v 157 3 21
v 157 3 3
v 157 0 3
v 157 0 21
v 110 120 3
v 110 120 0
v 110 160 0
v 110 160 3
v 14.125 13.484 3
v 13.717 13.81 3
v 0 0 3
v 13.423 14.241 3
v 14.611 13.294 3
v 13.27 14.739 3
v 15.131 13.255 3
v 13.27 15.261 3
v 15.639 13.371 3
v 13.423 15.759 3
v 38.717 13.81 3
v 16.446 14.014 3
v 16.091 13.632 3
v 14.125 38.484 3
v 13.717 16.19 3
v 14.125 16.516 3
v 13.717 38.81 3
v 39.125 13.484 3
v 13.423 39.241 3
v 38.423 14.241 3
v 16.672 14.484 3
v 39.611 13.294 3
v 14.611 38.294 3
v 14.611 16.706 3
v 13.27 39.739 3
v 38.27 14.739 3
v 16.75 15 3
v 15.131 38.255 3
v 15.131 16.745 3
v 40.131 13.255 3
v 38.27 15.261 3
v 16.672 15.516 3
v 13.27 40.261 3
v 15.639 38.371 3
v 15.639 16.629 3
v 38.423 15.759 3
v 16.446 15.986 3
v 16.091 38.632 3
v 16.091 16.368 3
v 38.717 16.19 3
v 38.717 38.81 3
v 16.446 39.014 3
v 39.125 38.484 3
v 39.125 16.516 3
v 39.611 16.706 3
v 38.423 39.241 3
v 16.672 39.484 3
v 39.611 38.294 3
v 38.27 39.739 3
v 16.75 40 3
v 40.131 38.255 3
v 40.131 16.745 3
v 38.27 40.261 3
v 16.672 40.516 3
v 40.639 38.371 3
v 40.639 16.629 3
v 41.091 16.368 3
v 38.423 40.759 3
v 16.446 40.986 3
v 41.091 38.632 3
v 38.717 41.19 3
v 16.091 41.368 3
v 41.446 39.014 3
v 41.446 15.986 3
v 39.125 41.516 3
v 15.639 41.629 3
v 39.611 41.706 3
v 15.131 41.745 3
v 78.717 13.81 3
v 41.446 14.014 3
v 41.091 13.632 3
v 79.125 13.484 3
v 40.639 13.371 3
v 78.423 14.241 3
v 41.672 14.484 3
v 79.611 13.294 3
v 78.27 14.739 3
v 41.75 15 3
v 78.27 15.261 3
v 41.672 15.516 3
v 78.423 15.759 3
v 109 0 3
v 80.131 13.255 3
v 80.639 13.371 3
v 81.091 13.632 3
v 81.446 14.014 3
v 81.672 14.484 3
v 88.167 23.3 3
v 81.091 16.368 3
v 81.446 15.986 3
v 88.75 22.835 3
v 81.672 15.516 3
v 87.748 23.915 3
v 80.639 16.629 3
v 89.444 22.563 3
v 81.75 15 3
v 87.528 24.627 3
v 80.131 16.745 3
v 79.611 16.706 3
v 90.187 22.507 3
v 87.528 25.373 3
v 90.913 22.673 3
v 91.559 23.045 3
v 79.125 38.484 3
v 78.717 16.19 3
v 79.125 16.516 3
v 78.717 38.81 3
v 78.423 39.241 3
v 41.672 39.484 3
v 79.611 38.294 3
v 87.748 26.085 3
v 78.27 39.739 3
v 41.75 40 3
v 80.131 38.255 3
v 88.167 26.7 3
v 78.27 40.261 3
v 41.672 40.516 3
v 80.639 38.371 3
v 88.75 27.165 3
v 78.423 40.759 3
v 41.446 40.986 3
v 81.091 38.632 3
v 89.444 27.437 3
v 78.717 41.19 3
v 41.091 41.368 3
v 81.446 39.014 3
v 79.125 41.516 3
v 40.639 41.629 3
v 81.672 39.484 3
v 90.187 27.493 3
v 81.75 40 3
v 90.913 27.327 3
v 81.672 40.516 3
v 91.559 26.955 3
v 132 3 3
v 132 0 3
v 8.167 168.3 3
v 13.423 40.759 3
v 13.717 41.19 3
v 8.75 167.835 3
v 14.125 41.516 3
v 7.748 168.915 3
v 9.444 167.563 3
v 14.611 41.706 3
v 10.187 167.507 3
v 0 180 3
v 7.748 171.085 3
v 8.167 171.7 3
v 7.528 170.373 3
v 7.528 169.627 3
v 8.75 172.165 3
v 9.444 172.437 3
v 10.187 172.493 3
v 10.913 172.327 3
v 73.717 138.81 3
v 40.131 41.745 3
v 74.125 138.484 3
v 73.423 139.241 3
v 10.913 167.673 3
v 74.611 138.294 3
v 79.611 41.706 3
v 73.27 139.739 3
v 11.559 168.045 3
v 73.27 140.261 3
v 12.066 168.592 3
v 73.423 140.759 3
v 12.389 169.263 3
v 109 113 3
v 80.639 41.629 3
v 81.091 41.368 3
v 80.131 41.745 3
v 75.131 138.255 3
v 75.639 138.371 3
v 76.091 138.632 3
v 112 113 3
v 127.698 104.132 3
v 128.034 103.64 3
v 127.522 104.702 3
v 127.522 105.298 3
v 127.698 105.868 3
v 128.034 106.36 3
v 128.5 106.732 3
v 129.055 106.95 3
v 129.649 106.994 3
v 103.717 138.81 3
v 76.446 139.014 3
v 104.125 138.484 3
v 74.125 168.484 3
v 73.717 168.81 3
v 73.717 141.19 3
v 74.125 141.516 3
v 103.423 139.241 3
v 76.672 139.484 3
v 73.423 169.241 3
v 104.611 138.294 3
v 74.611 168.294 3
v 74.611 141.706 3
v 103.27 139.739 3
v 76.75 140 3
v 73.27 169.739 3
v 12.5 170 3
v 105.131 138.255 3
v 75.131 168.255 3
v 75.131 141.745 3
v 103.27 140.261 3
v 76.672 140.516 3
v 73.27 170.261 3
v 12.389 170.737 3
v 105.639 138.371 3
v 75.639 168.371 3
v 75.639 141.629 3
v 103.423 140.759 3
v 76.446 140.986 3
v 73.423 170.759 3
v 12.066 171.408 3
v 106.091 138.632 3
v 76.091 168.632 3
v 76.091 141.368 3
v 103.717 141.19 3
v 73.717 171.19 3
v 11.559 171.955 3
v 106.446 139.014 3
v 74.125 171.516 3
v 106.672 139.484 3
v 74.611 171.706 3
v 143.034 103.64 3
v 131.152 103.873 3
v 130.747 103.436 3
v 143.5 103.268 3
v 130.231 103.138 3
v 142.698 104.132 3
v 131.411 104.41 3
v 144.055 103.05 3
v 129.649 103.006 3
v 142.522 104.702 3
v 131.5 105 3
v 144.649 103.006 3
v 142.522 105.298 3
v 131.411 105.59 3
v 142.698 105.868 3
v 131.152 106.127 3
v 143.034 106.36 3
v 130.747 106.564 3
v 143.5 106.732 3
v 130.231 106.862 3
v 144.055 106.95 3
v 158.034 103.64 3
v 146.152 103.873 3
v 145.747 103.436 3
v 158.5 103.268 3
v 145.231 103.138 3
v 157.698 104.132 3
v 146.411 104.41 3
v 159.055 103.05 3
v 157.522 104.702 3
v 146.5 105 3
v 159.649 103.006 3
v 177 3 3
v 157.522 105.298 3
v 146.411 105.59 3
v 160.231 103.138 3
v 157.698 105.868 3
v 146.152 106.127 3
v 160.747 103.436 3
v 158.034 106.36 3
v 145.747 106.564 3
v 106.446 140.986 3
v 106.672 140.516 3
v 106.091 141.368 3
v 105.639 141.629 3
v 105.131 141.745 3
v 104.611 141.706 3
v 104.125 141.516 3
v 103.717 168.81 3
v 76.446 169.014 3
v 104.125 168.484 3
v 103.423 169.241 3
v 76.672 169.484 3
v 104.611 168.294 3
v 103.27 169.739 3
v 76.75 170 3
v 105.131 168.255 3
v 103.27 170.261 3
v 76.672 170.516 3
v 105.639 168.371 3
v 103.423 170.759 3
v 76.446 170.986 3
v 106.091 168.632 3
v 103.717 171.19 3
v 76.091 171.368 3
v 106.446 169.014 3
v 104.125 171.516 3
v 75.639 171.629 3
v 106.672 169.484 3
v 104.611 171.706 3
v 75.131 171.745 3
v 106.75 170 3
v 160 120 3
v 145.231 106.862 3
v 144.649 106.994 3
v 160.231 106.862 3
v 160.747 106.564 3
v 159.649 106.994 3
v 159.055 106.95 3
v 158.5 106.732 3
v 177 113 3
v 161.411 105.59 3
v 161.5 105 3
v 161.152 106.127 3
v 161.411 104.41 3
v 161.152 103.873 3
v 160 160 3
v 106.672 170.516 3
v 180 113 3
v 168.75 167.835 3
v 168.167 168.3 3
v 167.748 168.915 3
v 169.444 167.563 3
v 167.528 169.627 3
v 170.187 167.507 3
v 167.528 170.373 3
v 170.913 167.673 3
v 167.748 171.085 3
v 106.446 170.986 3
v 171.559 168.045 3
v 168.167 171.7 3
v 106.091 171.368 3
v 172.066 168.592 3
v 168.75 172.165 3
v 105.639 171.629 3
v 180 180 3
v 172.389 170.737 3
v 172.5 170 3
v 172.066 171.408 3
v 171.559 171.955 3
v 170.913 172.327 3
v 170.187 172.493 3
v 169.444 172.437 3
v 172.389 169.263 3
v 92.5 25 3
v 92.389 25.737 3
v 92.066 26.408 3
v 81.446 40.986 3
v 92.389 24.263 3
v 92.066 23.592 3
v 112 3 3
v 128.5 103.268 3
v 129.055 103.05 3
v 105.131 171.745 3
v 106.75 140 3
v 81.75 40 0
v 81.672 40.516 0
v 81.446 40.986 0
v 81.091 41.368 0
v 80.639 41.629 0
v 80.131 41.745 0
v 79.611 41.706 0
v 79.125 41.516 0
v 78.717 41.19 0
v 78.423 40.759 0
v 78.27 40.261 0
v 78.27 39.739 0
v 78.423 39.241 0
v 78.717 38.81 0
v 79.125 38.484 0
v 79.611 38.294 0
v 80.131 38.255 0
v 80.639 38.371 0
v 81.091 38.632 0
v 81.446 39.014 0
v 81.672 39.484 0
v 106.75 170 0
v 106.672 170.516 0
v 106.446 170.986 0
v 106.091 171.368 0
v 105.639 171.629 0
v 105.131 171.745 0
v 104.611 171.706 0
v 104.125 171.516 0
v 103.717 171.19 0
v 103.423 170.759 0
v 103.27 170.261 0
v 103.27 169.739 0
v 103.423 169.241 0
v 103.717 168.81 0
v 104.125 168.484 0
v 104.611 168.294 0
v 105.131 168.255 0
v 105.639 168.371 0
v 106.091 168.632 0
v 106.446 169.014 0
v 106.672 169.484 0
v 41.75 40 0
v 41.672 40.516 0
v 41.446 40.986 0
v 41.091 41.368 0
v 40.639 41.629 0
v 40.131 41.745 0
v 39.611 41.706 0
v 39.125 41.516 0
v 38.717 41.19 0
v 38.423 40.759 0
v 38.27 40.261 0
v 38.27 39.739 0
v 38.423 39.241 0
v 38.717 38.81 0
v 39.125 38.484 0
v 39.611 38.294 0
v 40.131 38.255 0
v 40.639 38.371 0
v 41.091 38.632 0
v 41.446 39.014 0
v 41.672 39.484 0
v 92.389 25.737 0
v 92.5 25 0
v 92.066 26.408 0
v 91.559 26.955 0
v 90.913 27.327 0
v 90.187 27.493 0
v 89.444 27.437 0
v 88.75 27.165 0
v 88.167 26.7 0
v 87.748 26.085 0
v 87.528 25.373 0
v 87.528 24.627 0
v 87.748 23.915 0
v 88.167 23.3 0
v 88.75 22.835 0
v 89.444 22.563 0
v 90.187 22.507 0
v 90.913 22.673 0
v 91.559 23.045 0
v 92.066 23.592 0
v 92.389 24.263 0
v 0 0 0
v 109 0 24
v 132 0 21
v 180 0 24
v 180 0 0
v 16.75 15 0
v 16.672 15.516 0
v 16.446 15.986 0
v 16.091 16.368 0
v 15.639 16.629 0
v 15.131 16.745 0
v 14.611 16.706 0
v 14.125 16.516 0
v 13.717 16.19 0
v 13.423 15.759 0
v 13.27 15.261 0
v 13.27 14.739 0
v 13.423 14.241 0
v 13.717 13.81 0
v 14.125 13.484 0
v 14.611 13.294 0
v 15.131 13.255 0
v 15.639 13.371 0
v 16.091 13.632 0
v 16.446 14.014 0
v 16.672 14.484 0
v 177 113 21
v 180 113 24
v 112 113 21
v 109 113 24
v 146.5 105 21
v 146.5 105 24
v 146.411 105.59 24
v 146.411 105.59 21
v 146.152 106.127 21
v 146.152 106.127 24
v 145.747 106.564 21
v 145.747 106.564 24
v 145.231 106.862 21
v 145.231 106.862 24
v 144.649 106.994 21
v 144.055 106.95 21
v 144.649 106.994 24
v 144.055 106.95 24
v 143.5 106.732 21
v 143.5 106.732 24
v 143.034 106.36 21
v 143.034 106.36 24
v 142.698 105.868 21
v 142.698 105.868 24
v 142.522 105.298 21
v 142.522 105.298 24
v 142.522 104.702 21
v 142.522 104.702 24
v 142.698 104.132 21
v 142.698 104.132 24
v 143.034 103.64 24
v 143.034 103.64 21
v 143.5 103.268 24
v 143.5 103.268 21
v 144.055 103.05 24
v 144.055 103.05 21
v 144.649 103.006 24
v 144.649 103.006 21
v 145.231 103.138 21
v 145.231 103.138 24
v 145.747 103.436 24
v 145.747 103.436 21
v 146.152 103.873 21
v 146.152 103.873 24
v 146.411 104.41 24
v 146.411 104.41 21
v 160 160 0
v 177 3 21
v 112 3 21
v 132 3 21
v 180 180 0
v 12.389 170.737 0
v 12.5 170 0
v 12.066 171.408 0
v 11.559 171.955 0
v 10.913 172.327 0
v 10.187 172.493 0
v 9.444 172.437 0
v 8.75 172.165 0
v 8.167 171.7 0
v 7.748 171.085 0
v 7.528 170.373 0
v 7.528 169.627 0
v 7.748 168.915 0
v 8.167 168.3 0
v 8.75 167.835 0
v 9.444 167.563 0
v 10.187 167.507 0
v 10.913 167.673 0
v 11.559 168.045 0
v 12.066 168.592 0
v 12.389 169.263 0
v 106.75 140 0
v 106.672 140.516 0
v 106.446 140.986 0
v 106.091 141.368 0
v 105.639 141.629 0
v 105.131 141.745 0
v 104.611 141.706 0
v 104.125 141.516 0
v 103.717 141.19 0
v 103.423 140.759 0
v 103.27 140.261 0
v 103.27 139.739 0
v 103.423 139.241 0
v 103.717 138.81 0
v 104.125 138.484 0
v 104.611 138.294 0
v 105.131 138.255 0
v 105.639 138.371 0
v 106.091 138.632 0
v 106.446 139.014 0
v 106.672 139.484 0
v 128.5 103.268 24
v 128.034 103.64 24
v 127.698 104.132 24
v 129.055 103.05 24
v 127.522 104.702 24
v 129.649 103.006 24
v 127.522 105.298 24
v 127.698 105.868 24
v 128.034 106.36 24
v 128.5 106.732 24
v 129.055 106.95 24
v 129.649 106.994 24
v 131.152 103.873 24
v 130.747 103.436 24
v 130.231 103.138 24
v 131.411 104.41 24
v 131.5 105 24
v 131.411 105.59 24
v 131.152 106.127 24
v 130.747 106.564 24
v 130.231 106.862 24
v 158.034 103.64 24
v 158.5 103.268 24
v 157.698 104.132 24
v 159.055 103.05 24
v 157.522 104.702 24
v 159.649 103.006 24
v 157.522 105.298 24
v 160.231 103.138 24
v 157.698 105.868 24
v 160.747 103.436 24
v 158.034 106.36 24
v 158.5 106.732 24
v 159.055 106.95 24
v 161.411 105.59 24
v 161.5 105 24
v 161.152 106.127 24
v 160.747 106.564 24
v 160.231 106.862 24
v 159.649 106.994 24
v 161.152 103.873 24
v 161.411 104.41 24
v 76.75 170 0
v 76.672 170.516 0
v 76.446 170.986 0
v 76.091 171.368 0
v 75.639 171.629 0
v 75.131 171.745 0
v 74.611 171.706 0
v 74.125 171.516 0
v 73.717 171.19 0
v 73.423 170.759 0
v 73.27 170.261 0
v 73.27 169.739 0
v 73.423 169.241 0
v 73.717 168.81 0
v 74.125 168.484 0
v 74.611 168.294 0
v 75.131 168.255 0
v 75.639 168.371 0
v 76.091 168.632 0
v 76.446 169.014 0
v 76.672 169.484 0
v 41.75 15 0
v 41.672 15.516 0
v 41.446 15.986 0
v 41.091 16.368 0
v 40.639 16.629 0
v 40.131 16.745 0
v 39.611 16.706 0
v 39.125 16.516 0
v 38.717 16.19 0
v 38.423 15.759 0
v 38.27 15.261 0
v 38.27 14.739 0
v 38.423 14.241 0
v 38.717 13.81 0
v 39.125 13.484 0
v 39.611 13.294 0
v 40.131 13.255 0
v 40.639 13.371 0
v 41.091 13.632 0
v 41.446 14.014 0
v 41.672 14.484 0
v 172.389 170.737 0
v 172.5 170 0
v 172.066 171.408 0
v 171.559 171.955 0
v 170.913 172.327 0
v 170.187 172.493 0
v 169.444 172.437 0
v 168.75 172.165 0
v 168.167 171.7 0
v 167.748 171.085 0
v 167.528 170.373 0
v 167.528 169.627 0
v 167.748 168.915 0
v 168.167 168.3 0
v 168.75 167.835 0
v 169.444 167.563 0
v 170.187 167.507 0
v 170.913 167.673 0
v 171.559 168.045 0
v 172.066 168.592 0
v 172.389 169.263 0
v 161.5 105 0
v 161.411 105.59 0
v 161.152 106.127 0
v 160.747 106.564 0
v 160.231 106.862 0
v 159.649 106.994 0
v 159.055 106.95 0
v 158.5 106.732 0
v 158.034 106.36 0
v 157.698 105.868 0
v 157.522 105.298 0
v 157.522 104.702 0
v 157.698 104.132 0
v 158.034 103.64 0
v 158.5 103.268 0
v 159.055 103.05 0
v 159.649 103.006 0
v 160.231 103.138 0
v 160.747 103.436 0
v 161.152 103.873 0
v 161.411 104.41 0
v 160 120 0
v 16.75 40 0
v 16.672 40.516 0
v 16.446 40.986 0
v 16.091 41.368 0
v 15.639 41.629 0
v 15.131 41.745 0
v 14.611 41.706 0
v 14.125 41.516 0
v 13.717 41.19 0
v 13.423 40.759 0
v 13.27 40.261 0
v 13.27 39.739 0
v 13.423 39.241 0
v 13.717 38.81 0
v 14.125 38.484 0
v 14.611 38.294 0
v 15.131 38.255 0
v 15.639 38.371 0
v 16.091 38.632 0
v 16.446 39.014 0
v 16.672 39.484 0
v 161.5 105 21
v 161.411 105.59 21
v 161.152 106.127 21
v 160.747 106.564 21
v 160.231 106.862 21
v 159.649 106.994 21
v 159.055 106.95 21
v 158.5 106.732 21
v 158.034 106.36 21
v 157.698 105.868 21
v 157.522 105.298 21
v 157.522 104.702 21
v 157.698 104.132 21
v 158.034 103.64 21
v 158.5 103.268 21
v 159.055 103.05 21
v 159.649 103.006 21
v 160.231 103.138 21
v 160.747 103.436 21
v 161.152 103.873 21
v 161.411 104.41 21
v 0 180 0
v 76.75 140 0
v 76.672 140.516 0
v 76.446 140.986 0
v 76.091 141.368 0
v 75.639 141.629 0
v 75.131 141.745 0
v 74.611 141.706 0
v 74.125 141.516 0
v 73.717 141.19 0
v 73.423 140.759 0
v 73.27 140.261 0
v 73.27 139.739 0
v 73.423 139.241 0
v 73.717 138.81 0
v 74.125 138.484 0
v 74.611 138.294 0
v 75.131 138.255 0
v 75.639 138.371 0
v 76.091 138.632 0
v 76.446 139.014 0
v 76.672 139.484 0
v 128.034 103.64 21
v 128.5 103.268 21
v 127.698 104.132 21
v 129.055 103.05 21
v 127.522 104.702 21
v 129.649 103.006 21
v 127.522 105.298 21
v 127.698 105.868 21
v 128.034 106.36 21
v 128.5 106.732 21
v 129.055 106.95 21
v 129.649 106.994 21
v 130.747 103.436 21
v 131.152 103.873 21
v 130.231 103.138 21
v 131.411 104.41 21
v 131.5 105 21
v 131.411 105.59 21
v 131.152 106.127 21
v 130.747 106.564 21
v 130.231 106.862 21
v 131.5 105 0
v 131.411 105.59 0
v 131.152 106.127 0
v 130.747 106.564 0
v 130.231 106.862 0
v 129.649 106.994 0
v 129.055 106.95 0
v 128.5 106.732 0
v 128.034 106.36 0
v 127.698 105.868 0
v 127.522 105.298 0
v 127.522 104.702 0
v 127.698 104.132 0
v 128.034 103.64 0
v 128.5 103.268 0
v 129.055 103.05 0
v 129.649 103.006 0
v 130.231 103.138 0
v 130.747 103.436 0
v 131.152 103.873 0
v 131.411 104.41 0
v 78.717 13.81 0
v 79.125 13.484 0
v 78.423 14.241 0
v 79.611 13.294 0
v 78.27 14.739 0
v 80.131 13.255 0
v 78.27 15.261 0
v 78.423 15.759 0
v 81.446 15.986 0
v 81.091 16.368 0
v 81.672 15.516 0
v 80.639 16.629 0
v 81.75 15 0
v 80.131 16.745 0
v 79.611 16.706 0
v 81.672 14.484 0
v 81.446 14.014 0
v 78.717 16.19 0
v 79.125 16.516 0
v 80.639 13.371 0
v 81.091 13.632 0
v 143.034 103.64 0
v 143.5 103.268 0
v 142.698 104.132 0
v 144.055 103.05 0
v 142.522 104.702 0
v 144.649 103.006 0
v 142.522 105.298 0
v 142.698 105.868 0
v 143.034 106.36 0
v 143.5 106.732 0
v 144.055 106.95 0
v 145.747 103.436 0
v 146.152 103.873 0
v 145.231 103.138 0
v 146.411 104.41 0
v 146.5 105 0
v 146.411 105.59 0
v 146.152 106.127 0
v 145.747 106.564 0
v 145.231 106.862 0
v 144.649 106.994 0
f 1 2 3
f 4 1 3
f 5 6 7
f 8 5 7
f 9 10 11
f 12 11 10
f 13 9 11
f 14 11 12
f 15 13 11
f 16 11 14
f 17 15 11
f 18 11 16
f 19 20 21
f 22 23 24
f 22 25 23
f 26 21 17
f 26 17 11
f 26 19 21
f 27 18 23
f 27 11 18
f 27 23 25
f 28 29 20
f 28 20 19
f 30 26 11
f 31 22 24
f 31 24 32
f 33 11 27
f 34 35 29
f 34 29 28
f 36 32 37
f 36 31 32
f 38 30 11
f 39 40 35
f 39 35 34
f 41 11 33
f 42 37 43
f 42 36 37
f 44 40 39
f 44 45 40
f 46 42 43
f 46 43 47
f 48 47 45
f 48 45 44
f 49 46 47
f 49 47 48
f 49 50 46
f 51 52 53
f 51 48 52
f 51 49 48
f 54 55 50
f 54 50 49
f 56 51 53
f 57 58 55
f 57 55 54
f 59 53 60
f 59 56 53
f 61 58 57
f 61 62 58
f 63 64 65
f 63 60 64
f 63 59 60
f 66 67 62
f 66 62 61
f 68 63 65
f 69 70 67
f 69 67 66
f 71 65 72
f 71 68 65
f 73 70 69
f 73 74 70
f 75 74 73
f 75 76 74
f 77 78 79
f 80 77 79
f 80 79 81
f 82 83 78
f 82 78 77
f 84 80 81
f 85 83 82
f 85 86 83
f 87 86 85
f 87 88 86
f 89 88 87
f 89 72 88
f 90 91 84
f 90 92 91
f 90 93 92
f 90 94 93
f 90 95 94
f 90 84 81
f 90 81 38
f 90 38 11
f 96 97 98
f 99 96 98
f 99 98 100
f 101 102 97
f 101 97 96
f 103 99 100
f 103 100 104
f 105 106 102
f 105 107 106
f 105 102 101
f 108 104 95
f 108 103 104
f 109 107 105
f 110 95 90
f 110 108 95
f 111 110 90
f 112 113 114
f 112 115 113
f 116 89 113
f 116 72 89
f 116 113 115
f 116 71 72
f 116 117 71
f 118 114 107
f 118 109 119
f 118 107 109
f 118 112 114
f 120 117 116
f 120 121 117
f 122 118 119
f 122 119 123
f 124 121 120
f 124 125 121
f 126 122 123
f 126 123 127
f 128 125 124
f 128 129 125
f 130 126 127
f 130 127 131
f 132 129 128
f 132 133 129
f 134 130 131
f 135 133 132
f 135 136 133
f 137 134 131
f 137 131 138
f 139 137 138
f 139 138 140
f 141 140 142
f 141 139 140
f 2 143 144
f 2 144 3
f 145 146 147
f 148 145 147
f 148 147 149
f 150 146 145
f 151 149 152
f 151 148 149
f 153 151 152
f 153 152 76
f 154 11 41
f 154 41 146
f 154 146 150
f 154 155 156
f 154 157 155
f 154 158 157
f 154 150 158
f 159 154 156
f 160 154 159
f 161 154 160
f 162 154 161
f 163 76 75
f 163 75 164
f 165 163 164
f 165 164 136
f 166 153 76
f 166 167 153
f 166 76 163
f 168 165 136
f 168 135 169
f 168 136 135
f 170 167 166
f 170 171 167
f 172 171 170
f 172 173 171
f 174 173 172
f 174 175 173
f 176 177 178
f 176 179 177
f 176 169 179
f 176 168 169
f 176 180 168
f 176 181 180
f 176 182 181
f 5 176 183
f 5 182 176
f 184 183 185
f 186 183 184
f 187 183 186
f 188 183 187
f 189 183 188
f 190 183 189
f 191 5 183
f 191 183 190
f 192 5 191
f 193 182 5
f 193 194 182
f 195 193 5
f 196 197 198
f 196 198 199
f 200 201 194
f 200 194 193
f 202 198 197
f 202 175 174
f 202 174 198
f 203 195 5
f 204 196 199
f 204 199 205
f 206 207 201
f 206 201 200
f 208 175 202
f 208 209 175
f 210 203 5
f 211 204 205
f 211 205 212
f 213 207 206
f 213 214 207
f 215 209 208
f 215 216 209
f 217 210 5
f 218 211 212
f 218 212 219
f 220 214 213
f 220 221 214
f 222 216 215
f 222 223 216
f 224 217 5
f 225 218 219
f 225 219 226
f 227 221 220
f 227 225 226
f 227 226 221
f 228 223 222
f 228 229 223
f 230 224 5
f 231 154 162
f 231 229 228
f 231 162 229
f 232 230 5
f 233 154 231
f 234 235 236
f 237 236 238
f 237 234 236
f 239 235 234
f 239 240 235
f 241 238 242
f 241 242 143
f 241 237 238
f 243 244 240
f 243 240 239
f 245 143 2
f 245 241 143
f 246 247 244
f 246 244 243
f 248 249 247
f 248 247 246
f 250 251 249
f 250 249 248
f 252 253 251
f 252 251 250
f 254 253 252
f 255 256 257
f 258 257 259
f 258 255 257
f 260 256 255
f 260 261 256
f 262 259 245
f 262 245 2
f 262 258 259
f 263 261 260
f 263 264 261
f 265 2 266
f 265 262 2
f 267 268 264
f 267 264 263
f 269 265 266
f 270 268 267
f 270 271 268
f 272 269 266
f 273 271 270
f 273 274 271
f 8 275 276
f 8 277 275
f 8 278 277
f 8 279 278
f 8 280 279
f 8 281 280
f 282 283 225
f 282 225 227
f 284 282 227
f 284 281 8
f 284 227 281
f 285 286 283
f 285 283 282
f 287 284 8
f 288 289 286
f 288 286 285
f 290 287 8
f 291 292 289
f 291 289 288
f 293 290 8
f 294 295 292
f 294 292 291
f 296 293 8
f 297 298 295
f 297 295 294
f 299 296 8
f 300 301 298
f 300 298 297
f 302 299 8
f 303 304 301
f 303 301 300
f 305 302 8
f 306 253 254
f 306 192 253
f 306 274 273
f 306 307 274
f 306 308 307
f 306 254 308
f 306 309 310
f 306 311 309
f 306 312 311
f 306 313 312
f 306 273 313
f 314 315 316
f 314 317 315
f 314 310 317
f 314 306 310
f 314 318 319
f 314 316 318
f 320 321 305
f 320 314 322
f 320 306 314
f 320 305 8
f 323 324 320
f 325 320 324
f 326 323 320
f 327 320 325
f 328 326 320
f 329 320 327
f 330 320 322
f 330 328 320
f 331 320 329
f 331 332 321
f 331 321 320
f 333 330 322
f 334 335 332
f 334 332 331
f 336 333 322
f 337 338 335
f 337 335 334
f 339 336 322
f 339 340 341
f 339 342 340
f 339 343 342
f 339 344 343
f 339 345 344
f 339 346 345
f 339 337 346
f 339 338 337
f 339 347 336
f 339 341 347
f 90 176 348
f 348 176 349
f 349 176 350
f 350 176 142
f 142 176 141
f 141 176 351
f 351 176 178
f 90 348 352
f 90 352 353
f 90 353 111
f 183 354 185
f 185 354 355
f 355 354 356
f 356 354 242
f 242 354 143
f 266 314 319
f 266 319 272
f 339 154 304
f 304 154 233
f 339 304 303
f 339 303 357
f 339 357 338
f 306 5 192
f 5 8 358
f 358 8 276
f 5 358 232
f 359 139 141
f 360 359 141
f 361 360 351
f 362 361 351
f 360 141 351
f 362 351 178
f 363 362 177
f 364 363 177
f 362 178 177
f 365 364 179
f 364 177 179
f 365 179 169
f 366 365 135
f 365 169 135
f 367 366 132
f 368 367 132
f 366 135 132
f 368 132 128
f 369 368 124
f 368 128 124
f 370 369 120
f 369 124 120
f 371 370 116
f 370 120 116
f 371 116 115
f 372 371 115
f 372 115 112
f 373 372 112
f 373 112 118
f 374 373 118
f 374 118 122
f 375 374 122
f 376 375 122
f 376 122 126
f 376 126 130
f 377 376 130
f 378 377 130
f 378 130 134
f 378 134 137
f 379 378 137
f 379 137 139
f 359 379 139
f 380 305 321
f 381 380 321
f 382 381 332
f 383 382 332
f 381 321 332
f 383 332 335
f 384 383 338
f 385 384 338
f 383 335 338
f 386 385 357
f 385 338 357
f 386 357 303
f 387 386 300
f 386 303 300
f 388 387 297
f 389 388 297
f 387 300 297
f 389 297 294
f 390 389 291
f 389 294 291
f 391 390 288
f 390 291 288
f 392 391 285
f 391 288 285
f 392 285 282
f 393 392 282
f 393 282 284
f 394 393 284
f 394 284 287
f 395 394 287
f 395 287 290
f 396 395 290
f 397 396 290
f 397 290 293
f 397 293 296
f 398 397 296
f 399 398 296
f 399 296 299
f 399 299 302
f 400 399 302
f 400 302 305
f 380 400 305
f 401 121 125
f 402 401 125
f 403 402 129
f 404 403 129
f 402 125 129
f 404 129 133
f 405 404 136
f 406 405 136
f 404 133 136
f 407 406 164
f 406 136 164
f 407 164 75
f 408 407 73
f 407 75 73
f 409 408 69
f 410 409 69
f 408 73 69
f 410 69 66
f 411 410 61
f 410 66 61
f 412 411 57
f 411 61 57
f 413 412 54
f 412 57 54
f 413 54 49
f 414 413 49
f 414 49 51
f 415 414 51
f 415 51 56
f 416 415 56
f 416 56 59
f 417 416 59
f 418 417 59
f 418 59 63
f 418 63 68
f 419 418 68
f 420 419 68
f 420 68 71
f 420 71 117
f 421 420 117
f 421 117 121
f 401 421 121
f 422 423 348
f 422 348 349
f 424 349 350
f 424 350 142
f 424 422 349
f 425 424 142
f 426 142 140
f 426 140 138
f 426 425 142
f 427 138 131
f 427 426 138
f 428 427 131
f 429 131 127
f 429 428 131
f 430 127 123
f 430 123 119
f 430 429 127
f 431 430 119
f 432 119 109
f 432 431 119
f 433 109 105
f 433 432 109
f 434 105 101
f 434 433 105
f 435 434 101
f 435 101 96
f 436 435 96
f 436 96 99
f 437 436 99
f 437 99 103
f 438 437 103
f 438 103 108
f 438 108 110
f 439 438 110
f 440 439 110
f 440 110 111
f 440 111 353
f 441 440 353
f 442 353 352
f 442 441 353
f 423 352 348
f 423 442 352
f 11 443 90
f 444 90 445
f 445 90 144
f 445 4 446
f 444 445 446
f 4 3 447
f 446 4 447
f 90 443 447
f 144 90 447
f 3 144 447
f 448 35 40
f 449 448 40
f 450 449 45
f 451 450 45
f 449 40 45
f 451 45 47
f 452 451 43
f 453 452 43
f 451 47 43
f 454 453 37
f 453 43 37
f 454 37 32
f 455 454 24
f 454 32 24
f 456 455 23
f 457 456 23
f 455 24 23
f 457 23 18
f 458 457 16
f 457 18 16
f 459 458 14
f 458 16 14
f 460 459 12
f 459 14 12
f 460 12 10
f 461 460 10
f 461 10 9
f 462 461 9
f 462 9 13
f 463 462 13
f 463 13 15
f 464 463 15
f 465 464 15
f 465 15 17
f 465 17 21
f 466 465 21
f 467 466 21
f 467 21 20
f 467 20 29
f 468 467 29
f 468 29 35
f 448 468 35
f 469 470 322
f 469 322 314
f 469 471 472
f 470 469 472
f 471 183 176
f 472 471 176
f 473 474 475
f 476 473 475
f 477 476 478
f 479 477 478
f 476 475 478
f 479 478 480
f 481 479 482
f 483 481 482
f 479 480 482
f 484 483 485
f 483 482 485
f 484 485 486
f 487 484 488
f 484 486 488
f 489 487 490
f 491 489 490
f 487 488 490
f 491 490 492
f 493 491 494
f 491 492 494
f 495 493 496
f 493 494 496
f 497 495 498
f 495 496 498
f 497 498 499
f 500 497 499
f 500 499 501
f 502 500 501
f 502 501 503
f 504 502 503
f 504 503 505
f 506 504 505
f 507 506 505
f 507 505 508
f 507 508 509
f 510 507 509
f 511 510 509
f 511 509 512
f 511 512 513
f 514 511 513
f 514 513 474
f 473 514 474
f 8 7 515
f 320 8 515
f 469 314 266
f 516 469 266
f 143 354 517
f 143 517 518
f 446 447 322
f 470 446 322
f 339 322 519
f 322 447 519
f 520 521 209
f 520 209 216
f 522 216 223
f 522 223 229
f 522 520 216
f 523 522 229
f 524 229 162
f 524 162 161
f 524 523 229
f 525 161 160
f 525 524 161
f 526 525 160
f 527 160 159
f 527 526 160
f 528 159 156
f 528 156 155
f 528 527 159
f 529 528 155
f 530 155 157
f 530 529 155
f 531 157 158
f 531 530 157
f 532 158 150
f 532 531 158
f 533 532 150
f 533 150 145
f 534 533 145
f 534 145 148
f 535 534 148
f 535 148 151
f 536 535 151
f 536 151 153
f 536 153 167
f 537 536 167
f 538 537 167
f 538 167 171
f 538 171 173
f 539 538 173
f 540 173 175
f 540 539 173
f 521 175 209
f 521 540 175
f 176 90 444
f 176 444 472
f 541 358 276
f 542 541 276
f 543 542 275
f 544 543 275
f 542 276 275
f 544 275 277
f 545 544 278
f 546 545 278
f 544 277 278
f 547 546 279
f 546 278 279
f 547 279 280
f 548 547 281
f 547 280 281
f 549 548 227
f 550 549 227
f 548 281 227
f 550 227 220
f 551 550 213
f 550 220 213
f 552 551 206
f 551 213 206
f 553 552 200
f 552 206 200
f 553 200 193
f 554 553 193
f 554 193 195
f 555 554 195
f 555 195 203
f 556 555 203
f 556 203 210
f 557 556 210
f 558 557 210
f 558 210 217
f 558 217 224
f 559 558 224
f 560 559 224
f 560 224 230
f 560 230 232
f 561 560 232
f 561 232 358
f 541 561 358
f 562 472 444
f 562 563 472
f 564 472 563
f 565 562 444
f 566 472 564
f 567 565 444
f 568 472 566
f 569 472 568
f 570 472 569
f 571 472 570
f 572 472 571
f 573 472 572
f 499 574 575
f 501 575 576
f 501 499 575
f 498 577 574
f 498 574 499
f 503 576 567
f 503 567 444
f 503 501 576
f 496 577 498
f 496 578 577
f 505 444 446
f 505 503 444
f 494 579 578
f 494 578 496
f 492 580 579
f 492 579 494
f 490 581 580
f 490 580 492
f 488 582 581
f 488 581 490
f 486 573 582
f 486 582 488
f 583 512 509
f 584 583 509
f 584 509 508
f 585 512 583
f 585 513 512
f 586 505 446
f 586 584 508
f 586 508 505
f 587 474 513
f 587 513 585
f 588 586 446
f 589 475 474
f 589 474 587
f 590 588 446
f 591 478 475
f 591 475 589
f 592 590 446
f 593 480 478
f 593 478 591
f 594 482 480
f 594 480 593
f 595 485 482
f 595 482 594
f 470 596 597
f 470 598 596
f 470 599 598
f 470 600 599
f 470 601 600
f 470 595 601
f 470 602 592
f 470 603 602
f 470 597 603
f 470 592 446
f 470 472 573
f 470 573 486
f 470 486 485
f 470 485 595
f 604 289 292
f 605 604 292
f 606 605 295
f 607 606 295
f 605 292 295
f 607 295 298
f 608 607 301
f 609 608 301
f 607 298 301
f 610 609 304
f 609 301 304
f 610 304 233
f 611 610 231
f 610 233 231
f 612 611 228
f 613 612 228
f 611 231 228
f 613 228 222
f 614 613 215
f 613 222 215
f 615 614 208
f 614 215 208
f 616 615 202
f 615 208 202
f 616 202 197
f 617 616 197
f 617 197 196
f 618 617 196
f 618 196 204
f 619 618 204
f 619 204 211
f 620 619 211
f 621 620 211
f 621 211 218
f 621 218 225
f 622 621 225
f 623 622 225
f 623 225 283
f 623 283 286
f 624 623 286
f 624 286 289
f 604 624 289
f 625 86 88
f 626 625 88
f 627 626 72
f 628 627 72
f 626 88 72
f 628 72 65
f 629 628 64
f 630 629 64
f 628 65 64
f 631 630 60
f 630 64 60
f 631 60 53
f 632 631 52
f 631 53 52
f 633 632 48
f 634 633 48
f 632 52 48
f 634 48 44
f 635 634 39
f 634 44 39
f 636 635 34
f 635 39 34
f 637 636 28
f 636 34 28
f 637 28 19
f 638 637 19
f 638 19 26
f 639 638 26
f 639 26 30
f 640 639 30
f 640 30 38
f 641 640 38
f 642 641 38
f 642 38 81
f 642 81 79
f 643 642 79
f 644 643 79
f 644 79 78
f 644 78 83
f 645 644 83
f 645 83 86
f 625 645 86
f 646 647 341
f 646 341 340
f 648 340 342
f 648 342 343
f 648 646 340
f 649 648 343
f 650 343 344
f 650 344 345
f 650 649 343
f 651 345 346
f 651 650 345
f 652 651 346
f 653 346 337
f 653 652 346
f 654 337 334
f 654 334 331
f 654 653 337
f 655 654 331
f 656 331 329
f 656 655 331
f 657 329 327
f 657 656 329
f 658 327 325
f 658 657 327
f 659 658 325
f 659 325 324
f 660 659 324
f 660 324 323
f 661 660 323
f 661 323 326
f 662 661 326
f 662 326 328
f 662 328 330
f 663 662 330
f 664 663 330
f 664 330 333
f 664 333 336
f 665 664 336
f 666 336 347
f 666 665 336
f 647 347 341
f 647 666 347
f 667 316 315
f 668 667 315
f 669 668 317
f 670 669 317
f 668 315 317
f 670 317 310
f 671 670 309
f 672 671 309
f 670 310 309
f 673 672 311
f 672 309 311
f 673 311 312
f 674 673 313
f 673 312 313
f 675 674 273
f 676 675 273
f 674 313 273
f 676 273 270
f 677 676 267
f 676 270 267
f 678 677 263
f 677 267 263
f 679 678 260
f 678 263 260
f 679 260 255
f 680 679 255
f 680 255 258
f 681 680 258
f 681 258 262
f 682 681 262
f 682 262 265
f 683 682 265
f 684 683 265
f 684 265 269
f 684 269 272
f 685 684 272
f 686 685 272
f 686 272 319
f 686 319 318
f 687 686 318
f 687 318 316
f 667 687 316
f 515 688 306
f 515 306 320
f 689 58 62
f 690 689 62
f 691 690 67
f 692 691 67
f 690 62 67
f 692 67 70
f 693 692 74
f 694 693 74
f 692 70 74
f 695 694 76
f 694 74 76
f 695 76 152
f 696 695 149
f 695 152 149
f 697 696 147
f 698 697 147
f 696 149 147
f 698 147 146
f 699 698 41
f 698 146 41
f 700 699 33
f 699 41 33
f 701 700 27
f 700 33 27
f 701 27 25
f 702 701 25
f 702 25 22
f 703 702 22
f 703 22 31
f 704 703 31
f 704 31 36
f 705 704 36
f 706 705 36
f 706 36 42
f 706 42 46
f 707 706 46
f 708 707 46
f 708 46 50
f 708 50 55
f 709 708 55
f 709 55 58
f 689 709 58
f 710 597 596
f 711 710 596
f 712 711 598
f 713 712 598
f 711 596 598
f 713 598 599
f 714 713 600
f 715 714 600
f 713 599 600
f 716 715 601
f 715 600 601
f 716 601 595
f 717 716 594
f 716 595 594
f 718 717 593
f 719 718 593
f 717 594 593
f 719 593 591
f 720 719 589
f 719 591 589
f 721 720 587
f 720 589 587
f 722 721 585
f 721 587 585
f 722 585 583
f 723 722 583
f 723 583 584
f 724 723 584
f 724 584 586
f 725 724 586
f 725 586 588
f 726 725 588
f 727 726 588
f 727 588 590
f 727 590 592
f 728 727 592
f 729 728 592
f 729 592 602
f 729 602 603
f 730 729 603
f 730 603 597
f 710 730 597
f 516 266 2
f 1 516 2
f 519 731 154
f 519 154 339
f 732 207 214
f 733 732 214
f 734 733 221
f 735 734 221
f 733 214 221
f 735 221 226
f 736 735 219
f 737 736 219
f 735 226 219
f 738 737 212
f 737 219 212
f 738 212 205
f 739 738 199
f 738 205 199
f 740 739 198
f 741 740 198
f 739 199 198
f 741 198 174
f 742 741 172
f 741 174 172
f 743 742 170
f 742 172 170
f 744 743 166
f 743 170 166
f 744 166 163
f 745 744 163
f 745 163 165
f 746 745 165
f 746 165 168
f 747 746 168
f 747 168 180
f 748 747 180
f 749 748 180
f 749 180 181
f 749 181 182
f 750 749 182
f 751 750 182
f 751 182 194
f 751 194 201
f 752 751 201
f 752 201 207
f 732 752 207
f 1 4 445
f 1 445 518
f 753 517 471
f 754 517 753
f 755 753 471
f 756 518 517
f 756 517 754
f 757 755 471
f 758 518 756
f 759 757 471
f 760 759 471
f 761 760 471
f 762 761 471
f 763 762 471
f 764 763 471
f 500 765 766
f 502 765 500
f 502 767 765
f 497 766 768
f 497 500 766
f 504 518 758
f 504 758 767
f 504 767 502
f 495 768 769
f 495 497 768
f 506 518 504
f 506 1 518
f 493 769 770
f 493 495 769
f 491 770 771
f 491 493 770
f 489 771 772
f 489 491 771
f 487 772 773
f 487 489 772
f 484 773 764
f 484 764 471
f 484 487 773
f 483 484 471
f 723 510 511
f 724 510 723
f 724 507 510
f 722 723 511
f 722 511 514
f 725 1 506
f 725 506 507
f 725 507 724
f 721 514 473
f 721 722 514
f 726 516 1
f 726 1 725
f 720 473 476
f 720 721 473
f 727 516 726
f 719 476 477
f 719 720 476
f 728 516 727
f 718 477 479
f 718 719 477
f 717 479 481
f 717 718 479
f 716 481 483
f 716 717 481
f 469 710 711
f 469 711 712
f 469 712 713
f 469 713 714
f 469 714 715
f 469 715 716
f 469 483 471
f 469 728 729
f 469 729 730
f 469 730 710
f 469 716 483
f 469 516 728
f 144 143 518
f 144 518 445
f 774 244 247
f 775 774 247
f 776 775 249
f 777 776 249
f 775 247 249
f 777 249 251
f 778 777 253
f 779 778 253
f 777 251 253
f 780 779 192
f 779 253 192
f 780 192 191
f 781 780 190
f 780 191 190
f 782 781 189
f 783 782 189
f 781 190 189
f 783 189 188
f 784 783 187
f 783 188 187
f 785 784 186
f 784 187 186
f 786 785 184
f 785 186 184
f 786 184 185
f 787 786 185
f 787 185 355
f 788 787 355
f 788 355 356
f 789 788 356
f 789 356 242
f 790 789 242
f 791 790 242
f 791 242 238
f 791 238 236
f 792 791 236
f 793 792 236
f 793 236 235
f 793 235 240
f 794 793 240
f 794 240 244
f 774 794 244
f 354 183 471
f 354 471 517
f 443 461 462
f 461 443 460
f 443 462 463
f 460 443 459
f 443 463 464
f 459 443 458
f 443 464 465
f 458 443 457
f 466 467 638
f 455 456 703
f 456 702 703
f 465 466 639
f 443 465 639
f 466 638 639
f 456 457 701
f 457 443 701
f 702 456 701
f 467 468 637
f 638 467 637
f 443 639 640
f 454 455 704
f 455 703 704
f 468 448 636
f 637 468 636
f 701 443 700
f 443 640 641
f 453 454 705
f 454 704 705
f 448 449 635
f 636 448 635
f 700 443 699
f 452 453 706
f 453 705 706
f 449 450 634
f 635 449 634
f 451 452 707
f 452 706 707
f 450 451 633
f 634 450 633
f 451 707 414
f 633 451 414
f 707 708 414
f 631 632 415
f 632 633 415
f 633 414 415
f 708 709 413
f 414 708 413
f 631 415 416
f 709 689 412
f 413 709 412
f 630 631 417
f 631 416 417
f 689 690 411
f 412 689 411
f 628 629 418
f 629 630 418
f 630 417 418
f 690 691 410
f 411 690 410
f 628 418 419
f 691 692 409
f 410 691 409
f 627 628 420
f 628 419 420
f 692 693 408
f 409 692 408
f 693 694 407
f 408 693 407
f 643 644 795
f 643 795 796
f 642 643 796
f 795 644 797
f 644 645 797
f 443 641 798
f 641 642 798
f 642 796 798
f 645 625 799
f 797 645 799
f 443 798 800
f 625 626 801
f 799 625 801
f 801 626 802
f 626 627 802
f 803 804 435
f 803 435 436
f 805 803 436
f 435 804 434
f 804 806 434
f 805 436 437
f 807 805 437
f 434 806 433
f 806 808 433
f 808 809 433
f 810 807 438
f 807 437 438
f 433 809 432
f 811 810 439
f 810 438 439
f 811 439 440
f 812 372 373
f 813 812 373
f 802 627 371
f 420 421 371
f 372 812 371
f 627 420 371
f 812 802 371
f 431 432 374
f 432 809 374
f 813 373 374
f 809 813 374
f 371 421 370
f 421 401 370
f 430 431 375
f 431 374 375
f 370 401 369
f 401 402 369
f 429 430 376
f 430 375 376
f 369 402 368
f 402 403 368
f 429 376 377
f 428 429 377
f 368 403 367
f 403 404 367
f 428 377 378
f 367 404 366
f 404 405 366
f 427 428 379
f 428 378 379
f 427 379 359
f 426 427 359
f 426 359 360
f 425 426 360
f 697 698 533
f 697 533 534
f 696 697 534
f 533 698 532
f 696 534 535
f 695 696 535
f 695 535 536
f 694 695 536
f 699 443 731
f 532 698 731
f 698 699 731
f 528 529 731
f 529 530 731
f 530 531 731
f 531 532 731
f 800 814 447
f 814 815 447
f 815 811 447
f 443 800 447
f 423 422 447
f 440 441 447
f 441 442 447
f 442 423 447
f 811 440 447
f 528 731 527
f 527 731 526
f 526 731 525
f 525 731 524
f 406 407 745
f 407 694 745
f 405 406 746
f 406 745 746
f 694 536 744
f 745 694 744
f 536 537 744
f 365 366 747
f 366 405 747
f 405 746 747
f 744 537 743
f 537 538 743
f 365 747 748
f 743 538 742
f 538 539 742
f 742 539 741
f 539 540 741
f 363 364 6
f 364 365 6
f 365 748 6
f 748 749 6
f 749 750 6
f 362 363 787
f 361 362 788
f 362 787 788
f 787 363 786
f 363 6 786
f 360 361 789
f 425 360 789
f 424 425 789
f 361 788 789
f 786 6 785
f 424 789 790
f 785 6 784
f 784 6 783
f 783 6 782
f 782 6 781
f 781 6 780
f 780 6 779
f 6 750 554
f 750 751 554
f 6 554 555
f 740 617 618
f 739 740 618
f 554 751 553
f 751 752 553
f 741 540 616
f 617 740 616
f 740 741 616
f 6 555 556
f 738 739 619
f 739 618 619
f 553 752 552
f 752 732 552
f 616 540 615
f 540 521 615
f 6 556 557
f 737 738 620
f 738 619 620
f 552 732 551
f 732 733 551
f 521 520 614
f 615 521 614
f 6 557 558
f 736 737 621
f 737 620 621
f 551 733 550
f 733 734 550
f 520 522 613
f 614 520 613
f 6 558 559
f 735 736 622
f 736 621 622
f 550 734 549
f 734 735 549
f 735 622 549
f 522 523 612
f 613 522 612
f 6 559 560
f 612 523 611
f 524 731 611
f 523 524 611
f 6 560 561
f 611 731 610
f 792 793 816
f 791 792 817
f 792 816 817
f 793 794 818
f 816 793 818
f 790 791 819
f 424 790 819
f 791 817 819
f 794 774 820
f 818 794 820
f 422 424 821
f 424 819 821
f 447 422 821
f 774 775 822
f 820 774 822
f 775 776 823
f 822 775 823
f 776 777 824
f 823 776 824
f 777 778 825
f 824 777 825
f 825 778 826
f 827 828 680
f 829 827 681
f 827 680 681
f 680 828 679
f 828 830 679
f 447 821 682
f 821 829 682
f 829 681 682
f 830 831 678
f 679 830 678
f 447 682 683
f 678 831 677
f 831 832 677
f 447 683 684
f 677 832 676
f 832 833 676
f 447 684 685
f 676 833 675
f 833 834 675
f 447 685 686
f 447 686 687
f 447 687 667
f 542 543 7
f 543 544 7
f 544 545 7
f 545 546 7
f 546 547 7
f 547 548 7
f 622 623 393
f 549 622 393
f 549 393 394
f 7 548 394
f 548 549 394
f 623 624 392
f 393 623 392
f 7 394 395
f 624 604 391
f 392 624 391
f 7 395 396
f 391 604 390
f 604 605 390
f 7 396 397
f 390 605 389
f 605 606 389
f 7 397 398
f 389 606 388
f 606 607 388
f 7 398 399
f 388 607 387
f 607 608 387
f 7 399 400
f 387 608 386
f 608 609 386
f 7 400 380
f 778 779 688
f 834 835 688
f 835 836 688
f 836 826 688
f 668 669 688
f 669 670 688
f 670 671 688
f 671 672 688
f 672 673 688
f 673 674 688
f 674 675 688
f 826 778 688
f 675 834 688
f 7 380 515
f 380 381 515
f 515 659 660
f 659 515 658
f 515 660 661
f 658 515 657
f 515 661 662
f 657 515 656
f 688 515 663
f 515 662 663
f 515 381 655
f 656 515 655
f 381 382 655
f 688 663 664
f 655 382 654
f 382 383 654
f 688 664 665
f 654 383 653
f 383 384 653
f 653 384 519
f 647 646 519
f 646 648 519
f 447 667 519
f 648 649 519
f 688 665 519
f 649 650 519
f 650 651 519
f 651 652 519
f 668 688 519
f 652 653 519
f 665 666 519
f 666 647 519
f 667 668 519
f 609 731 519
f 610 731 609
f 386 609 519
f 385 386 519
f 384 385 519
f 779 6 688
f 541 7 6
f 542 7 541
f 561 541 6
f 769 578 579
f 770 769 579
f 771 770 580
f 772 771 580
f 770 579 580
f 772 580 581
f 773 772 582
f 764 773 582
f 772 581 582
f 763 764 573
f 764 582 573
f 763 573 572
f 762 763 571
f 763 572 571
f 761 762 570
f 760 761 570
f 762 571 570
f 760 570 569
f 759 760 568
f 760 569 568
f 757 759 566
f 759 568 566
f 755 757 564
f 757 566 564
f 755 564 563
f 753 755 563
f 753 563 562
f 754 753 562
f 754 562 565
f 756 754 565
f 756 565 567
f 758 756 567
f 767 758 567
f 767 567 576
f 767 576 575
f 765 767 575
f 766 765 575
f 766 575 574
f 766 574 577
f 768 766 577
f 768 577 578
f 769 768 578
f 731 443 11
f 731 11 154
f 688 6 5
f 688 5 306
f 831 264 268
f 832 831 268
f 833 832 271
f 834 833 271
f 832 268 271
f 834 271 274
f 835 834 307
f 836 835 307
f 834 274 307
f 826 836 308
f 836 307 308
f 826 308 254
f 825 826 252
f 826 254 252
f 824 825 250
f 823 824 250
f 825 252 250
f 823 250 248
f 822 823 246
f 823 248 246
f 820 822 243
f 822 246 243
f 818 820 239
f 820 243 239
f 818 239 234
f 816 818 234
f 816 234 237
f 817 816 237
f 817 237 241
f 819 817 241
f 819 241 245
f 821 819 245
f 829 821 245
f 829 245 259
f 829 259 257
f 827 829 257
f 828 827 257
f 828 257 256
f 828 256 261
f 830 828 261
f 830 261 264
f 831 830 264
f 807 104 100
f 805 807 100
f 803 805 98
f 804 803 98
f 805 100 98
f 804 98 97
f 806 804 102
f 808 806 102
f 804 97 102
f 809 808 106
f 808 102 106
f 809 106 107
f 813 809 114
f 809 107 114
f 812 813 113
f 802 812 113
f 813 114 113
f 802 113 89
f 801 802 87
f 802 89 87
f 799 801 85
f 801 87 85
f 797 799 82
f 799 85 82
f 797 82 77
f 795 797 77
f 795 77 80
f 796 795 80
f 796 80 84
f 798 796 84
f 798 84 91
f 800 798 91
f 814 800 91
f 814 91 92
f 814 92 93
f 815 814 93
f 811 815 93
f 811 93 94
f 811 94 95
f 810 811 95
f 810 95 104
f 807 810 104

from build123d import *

# Parameters (mm, degrees)
SKETCH_W        = 180
SKETCH_H        = 180
SKETCH_R        = 2.5
SKETCH_W_2      = 50
SKETCH_H_2      = 40
PAD_DEPTH       = 3
PAD001_DEPTH    = 21
SKETCH002_W     = 113
SKETCH002_H     = 3
PAD002_DEPTH    = 71
SKETCH003_R     = 2
POCKET_DEPTH    = 100
SKETCH004_R     = 1.75
POCKET001_DEPTH = 5
SKETCH005_R     = 1.75
POCKET002_DEPTH = 5


with BuildPart() as part:
    # Sketch → Pad (new body)
    with BuildSketch(Plane.XY):
        with Locations((90, 90)):
            Rectangle(SKETCH_W, SKETCH_H)
        with Locations((90, 25)):
            Circle(SKETCH_R, mode=Mode.SUBTRACT)
        with Locations((10, 170)):
            Circle(SKETCH_R, mode=Mode.SUBTRACT)
        with Locations((170, 170)):
            Circle(SKETCH_R, mode=Mode.SUBTRACT)
        with Locations((135, 140)):
            Rectangle(SKETCH_W_2, SKETCH_H_2, mode=Mode.SUBTRACT)
    extrude(amount=PAD_DEPTH)

    # Sketch001 (on Face13 of Pad) → Pad001 (join)
    with BuildSketch(Plane.XY.offset(3)):
        Polygon((180, 0), (180, 113), (177, 113), (177, 3), (157, 3), (157, 0), align=None)
        Polygon((112, 113), (112, 3), (132, 3), (132, 0), (109, 0), (109, 113), align=None)
    extrude(amount=PAD001_DEPTH)

    # Sketch002 (on Face9 of Pad001) → Pad002 (join)
    with BuildSketch(Plane.YZ.offset(180)):
        with Locations((56.5, 22.5)):
            Rectangle(SKETCH002_W, SKETCH002_H)
    extrude(amount=-PAD002_DEPTH)

    # Sketch003 (on Face37 of Pad002) → Pocket (cut)
    with BuildSketch(Plane.XY.offset(24)):
        with Locations((129.5, 105)):
            Circle(SKETCH003_R)
        with Locations((144.5, 105)):
            Circle(SKETCH003_R)
        with Locations((159.5, 105)):
            Circle(SKETCH003_R)
    extrude(amount=-POCKET_DEPTH, mode=Mode.SUBTRACT)

    # Sketch004 (on Face5 of Pocket) → Pocket001 (cut)
    with BuildSketch(Plane.XY.offset(3)):
        with Locations((75, 170)):
            Circle(SKETCH004_R)
        with Locations((105, 170)):
            Circle(SKETCH004_R)
        with Locations((75, 140)):
            Circle(SKETCH004_R)
        with Locations((105, 140)):
            Circle(SKETCH004_R)
    extrude(amount=-POCKET001_DEPTH, mode=Mode.SUBTRACT)

    # Sketch005 (on Face5 of Pocket001) → Pocket002 (cut)
    with BuildSketch(Plane.XY.offset(3)):
        with Locations((15, 15)):
            Circle(SKETCH005_R)
        with Locations((15, 40)):
            Circle(SKETCH005_R)
        with Locations((40, 40)):
            Circle(SKETCH005_R)
        with Locations((40, 15)):
            Circle(SKETCH005_R)
        with Locations((80, 40)):
            Circle(SKETCH005_R)
        with Locations((80, 15)):
            Circle(SKETCH005_R)
    extrude(amount=-POCKET002_DEPTH, mode=Mode.SUBTRACT)


solid = part.part
